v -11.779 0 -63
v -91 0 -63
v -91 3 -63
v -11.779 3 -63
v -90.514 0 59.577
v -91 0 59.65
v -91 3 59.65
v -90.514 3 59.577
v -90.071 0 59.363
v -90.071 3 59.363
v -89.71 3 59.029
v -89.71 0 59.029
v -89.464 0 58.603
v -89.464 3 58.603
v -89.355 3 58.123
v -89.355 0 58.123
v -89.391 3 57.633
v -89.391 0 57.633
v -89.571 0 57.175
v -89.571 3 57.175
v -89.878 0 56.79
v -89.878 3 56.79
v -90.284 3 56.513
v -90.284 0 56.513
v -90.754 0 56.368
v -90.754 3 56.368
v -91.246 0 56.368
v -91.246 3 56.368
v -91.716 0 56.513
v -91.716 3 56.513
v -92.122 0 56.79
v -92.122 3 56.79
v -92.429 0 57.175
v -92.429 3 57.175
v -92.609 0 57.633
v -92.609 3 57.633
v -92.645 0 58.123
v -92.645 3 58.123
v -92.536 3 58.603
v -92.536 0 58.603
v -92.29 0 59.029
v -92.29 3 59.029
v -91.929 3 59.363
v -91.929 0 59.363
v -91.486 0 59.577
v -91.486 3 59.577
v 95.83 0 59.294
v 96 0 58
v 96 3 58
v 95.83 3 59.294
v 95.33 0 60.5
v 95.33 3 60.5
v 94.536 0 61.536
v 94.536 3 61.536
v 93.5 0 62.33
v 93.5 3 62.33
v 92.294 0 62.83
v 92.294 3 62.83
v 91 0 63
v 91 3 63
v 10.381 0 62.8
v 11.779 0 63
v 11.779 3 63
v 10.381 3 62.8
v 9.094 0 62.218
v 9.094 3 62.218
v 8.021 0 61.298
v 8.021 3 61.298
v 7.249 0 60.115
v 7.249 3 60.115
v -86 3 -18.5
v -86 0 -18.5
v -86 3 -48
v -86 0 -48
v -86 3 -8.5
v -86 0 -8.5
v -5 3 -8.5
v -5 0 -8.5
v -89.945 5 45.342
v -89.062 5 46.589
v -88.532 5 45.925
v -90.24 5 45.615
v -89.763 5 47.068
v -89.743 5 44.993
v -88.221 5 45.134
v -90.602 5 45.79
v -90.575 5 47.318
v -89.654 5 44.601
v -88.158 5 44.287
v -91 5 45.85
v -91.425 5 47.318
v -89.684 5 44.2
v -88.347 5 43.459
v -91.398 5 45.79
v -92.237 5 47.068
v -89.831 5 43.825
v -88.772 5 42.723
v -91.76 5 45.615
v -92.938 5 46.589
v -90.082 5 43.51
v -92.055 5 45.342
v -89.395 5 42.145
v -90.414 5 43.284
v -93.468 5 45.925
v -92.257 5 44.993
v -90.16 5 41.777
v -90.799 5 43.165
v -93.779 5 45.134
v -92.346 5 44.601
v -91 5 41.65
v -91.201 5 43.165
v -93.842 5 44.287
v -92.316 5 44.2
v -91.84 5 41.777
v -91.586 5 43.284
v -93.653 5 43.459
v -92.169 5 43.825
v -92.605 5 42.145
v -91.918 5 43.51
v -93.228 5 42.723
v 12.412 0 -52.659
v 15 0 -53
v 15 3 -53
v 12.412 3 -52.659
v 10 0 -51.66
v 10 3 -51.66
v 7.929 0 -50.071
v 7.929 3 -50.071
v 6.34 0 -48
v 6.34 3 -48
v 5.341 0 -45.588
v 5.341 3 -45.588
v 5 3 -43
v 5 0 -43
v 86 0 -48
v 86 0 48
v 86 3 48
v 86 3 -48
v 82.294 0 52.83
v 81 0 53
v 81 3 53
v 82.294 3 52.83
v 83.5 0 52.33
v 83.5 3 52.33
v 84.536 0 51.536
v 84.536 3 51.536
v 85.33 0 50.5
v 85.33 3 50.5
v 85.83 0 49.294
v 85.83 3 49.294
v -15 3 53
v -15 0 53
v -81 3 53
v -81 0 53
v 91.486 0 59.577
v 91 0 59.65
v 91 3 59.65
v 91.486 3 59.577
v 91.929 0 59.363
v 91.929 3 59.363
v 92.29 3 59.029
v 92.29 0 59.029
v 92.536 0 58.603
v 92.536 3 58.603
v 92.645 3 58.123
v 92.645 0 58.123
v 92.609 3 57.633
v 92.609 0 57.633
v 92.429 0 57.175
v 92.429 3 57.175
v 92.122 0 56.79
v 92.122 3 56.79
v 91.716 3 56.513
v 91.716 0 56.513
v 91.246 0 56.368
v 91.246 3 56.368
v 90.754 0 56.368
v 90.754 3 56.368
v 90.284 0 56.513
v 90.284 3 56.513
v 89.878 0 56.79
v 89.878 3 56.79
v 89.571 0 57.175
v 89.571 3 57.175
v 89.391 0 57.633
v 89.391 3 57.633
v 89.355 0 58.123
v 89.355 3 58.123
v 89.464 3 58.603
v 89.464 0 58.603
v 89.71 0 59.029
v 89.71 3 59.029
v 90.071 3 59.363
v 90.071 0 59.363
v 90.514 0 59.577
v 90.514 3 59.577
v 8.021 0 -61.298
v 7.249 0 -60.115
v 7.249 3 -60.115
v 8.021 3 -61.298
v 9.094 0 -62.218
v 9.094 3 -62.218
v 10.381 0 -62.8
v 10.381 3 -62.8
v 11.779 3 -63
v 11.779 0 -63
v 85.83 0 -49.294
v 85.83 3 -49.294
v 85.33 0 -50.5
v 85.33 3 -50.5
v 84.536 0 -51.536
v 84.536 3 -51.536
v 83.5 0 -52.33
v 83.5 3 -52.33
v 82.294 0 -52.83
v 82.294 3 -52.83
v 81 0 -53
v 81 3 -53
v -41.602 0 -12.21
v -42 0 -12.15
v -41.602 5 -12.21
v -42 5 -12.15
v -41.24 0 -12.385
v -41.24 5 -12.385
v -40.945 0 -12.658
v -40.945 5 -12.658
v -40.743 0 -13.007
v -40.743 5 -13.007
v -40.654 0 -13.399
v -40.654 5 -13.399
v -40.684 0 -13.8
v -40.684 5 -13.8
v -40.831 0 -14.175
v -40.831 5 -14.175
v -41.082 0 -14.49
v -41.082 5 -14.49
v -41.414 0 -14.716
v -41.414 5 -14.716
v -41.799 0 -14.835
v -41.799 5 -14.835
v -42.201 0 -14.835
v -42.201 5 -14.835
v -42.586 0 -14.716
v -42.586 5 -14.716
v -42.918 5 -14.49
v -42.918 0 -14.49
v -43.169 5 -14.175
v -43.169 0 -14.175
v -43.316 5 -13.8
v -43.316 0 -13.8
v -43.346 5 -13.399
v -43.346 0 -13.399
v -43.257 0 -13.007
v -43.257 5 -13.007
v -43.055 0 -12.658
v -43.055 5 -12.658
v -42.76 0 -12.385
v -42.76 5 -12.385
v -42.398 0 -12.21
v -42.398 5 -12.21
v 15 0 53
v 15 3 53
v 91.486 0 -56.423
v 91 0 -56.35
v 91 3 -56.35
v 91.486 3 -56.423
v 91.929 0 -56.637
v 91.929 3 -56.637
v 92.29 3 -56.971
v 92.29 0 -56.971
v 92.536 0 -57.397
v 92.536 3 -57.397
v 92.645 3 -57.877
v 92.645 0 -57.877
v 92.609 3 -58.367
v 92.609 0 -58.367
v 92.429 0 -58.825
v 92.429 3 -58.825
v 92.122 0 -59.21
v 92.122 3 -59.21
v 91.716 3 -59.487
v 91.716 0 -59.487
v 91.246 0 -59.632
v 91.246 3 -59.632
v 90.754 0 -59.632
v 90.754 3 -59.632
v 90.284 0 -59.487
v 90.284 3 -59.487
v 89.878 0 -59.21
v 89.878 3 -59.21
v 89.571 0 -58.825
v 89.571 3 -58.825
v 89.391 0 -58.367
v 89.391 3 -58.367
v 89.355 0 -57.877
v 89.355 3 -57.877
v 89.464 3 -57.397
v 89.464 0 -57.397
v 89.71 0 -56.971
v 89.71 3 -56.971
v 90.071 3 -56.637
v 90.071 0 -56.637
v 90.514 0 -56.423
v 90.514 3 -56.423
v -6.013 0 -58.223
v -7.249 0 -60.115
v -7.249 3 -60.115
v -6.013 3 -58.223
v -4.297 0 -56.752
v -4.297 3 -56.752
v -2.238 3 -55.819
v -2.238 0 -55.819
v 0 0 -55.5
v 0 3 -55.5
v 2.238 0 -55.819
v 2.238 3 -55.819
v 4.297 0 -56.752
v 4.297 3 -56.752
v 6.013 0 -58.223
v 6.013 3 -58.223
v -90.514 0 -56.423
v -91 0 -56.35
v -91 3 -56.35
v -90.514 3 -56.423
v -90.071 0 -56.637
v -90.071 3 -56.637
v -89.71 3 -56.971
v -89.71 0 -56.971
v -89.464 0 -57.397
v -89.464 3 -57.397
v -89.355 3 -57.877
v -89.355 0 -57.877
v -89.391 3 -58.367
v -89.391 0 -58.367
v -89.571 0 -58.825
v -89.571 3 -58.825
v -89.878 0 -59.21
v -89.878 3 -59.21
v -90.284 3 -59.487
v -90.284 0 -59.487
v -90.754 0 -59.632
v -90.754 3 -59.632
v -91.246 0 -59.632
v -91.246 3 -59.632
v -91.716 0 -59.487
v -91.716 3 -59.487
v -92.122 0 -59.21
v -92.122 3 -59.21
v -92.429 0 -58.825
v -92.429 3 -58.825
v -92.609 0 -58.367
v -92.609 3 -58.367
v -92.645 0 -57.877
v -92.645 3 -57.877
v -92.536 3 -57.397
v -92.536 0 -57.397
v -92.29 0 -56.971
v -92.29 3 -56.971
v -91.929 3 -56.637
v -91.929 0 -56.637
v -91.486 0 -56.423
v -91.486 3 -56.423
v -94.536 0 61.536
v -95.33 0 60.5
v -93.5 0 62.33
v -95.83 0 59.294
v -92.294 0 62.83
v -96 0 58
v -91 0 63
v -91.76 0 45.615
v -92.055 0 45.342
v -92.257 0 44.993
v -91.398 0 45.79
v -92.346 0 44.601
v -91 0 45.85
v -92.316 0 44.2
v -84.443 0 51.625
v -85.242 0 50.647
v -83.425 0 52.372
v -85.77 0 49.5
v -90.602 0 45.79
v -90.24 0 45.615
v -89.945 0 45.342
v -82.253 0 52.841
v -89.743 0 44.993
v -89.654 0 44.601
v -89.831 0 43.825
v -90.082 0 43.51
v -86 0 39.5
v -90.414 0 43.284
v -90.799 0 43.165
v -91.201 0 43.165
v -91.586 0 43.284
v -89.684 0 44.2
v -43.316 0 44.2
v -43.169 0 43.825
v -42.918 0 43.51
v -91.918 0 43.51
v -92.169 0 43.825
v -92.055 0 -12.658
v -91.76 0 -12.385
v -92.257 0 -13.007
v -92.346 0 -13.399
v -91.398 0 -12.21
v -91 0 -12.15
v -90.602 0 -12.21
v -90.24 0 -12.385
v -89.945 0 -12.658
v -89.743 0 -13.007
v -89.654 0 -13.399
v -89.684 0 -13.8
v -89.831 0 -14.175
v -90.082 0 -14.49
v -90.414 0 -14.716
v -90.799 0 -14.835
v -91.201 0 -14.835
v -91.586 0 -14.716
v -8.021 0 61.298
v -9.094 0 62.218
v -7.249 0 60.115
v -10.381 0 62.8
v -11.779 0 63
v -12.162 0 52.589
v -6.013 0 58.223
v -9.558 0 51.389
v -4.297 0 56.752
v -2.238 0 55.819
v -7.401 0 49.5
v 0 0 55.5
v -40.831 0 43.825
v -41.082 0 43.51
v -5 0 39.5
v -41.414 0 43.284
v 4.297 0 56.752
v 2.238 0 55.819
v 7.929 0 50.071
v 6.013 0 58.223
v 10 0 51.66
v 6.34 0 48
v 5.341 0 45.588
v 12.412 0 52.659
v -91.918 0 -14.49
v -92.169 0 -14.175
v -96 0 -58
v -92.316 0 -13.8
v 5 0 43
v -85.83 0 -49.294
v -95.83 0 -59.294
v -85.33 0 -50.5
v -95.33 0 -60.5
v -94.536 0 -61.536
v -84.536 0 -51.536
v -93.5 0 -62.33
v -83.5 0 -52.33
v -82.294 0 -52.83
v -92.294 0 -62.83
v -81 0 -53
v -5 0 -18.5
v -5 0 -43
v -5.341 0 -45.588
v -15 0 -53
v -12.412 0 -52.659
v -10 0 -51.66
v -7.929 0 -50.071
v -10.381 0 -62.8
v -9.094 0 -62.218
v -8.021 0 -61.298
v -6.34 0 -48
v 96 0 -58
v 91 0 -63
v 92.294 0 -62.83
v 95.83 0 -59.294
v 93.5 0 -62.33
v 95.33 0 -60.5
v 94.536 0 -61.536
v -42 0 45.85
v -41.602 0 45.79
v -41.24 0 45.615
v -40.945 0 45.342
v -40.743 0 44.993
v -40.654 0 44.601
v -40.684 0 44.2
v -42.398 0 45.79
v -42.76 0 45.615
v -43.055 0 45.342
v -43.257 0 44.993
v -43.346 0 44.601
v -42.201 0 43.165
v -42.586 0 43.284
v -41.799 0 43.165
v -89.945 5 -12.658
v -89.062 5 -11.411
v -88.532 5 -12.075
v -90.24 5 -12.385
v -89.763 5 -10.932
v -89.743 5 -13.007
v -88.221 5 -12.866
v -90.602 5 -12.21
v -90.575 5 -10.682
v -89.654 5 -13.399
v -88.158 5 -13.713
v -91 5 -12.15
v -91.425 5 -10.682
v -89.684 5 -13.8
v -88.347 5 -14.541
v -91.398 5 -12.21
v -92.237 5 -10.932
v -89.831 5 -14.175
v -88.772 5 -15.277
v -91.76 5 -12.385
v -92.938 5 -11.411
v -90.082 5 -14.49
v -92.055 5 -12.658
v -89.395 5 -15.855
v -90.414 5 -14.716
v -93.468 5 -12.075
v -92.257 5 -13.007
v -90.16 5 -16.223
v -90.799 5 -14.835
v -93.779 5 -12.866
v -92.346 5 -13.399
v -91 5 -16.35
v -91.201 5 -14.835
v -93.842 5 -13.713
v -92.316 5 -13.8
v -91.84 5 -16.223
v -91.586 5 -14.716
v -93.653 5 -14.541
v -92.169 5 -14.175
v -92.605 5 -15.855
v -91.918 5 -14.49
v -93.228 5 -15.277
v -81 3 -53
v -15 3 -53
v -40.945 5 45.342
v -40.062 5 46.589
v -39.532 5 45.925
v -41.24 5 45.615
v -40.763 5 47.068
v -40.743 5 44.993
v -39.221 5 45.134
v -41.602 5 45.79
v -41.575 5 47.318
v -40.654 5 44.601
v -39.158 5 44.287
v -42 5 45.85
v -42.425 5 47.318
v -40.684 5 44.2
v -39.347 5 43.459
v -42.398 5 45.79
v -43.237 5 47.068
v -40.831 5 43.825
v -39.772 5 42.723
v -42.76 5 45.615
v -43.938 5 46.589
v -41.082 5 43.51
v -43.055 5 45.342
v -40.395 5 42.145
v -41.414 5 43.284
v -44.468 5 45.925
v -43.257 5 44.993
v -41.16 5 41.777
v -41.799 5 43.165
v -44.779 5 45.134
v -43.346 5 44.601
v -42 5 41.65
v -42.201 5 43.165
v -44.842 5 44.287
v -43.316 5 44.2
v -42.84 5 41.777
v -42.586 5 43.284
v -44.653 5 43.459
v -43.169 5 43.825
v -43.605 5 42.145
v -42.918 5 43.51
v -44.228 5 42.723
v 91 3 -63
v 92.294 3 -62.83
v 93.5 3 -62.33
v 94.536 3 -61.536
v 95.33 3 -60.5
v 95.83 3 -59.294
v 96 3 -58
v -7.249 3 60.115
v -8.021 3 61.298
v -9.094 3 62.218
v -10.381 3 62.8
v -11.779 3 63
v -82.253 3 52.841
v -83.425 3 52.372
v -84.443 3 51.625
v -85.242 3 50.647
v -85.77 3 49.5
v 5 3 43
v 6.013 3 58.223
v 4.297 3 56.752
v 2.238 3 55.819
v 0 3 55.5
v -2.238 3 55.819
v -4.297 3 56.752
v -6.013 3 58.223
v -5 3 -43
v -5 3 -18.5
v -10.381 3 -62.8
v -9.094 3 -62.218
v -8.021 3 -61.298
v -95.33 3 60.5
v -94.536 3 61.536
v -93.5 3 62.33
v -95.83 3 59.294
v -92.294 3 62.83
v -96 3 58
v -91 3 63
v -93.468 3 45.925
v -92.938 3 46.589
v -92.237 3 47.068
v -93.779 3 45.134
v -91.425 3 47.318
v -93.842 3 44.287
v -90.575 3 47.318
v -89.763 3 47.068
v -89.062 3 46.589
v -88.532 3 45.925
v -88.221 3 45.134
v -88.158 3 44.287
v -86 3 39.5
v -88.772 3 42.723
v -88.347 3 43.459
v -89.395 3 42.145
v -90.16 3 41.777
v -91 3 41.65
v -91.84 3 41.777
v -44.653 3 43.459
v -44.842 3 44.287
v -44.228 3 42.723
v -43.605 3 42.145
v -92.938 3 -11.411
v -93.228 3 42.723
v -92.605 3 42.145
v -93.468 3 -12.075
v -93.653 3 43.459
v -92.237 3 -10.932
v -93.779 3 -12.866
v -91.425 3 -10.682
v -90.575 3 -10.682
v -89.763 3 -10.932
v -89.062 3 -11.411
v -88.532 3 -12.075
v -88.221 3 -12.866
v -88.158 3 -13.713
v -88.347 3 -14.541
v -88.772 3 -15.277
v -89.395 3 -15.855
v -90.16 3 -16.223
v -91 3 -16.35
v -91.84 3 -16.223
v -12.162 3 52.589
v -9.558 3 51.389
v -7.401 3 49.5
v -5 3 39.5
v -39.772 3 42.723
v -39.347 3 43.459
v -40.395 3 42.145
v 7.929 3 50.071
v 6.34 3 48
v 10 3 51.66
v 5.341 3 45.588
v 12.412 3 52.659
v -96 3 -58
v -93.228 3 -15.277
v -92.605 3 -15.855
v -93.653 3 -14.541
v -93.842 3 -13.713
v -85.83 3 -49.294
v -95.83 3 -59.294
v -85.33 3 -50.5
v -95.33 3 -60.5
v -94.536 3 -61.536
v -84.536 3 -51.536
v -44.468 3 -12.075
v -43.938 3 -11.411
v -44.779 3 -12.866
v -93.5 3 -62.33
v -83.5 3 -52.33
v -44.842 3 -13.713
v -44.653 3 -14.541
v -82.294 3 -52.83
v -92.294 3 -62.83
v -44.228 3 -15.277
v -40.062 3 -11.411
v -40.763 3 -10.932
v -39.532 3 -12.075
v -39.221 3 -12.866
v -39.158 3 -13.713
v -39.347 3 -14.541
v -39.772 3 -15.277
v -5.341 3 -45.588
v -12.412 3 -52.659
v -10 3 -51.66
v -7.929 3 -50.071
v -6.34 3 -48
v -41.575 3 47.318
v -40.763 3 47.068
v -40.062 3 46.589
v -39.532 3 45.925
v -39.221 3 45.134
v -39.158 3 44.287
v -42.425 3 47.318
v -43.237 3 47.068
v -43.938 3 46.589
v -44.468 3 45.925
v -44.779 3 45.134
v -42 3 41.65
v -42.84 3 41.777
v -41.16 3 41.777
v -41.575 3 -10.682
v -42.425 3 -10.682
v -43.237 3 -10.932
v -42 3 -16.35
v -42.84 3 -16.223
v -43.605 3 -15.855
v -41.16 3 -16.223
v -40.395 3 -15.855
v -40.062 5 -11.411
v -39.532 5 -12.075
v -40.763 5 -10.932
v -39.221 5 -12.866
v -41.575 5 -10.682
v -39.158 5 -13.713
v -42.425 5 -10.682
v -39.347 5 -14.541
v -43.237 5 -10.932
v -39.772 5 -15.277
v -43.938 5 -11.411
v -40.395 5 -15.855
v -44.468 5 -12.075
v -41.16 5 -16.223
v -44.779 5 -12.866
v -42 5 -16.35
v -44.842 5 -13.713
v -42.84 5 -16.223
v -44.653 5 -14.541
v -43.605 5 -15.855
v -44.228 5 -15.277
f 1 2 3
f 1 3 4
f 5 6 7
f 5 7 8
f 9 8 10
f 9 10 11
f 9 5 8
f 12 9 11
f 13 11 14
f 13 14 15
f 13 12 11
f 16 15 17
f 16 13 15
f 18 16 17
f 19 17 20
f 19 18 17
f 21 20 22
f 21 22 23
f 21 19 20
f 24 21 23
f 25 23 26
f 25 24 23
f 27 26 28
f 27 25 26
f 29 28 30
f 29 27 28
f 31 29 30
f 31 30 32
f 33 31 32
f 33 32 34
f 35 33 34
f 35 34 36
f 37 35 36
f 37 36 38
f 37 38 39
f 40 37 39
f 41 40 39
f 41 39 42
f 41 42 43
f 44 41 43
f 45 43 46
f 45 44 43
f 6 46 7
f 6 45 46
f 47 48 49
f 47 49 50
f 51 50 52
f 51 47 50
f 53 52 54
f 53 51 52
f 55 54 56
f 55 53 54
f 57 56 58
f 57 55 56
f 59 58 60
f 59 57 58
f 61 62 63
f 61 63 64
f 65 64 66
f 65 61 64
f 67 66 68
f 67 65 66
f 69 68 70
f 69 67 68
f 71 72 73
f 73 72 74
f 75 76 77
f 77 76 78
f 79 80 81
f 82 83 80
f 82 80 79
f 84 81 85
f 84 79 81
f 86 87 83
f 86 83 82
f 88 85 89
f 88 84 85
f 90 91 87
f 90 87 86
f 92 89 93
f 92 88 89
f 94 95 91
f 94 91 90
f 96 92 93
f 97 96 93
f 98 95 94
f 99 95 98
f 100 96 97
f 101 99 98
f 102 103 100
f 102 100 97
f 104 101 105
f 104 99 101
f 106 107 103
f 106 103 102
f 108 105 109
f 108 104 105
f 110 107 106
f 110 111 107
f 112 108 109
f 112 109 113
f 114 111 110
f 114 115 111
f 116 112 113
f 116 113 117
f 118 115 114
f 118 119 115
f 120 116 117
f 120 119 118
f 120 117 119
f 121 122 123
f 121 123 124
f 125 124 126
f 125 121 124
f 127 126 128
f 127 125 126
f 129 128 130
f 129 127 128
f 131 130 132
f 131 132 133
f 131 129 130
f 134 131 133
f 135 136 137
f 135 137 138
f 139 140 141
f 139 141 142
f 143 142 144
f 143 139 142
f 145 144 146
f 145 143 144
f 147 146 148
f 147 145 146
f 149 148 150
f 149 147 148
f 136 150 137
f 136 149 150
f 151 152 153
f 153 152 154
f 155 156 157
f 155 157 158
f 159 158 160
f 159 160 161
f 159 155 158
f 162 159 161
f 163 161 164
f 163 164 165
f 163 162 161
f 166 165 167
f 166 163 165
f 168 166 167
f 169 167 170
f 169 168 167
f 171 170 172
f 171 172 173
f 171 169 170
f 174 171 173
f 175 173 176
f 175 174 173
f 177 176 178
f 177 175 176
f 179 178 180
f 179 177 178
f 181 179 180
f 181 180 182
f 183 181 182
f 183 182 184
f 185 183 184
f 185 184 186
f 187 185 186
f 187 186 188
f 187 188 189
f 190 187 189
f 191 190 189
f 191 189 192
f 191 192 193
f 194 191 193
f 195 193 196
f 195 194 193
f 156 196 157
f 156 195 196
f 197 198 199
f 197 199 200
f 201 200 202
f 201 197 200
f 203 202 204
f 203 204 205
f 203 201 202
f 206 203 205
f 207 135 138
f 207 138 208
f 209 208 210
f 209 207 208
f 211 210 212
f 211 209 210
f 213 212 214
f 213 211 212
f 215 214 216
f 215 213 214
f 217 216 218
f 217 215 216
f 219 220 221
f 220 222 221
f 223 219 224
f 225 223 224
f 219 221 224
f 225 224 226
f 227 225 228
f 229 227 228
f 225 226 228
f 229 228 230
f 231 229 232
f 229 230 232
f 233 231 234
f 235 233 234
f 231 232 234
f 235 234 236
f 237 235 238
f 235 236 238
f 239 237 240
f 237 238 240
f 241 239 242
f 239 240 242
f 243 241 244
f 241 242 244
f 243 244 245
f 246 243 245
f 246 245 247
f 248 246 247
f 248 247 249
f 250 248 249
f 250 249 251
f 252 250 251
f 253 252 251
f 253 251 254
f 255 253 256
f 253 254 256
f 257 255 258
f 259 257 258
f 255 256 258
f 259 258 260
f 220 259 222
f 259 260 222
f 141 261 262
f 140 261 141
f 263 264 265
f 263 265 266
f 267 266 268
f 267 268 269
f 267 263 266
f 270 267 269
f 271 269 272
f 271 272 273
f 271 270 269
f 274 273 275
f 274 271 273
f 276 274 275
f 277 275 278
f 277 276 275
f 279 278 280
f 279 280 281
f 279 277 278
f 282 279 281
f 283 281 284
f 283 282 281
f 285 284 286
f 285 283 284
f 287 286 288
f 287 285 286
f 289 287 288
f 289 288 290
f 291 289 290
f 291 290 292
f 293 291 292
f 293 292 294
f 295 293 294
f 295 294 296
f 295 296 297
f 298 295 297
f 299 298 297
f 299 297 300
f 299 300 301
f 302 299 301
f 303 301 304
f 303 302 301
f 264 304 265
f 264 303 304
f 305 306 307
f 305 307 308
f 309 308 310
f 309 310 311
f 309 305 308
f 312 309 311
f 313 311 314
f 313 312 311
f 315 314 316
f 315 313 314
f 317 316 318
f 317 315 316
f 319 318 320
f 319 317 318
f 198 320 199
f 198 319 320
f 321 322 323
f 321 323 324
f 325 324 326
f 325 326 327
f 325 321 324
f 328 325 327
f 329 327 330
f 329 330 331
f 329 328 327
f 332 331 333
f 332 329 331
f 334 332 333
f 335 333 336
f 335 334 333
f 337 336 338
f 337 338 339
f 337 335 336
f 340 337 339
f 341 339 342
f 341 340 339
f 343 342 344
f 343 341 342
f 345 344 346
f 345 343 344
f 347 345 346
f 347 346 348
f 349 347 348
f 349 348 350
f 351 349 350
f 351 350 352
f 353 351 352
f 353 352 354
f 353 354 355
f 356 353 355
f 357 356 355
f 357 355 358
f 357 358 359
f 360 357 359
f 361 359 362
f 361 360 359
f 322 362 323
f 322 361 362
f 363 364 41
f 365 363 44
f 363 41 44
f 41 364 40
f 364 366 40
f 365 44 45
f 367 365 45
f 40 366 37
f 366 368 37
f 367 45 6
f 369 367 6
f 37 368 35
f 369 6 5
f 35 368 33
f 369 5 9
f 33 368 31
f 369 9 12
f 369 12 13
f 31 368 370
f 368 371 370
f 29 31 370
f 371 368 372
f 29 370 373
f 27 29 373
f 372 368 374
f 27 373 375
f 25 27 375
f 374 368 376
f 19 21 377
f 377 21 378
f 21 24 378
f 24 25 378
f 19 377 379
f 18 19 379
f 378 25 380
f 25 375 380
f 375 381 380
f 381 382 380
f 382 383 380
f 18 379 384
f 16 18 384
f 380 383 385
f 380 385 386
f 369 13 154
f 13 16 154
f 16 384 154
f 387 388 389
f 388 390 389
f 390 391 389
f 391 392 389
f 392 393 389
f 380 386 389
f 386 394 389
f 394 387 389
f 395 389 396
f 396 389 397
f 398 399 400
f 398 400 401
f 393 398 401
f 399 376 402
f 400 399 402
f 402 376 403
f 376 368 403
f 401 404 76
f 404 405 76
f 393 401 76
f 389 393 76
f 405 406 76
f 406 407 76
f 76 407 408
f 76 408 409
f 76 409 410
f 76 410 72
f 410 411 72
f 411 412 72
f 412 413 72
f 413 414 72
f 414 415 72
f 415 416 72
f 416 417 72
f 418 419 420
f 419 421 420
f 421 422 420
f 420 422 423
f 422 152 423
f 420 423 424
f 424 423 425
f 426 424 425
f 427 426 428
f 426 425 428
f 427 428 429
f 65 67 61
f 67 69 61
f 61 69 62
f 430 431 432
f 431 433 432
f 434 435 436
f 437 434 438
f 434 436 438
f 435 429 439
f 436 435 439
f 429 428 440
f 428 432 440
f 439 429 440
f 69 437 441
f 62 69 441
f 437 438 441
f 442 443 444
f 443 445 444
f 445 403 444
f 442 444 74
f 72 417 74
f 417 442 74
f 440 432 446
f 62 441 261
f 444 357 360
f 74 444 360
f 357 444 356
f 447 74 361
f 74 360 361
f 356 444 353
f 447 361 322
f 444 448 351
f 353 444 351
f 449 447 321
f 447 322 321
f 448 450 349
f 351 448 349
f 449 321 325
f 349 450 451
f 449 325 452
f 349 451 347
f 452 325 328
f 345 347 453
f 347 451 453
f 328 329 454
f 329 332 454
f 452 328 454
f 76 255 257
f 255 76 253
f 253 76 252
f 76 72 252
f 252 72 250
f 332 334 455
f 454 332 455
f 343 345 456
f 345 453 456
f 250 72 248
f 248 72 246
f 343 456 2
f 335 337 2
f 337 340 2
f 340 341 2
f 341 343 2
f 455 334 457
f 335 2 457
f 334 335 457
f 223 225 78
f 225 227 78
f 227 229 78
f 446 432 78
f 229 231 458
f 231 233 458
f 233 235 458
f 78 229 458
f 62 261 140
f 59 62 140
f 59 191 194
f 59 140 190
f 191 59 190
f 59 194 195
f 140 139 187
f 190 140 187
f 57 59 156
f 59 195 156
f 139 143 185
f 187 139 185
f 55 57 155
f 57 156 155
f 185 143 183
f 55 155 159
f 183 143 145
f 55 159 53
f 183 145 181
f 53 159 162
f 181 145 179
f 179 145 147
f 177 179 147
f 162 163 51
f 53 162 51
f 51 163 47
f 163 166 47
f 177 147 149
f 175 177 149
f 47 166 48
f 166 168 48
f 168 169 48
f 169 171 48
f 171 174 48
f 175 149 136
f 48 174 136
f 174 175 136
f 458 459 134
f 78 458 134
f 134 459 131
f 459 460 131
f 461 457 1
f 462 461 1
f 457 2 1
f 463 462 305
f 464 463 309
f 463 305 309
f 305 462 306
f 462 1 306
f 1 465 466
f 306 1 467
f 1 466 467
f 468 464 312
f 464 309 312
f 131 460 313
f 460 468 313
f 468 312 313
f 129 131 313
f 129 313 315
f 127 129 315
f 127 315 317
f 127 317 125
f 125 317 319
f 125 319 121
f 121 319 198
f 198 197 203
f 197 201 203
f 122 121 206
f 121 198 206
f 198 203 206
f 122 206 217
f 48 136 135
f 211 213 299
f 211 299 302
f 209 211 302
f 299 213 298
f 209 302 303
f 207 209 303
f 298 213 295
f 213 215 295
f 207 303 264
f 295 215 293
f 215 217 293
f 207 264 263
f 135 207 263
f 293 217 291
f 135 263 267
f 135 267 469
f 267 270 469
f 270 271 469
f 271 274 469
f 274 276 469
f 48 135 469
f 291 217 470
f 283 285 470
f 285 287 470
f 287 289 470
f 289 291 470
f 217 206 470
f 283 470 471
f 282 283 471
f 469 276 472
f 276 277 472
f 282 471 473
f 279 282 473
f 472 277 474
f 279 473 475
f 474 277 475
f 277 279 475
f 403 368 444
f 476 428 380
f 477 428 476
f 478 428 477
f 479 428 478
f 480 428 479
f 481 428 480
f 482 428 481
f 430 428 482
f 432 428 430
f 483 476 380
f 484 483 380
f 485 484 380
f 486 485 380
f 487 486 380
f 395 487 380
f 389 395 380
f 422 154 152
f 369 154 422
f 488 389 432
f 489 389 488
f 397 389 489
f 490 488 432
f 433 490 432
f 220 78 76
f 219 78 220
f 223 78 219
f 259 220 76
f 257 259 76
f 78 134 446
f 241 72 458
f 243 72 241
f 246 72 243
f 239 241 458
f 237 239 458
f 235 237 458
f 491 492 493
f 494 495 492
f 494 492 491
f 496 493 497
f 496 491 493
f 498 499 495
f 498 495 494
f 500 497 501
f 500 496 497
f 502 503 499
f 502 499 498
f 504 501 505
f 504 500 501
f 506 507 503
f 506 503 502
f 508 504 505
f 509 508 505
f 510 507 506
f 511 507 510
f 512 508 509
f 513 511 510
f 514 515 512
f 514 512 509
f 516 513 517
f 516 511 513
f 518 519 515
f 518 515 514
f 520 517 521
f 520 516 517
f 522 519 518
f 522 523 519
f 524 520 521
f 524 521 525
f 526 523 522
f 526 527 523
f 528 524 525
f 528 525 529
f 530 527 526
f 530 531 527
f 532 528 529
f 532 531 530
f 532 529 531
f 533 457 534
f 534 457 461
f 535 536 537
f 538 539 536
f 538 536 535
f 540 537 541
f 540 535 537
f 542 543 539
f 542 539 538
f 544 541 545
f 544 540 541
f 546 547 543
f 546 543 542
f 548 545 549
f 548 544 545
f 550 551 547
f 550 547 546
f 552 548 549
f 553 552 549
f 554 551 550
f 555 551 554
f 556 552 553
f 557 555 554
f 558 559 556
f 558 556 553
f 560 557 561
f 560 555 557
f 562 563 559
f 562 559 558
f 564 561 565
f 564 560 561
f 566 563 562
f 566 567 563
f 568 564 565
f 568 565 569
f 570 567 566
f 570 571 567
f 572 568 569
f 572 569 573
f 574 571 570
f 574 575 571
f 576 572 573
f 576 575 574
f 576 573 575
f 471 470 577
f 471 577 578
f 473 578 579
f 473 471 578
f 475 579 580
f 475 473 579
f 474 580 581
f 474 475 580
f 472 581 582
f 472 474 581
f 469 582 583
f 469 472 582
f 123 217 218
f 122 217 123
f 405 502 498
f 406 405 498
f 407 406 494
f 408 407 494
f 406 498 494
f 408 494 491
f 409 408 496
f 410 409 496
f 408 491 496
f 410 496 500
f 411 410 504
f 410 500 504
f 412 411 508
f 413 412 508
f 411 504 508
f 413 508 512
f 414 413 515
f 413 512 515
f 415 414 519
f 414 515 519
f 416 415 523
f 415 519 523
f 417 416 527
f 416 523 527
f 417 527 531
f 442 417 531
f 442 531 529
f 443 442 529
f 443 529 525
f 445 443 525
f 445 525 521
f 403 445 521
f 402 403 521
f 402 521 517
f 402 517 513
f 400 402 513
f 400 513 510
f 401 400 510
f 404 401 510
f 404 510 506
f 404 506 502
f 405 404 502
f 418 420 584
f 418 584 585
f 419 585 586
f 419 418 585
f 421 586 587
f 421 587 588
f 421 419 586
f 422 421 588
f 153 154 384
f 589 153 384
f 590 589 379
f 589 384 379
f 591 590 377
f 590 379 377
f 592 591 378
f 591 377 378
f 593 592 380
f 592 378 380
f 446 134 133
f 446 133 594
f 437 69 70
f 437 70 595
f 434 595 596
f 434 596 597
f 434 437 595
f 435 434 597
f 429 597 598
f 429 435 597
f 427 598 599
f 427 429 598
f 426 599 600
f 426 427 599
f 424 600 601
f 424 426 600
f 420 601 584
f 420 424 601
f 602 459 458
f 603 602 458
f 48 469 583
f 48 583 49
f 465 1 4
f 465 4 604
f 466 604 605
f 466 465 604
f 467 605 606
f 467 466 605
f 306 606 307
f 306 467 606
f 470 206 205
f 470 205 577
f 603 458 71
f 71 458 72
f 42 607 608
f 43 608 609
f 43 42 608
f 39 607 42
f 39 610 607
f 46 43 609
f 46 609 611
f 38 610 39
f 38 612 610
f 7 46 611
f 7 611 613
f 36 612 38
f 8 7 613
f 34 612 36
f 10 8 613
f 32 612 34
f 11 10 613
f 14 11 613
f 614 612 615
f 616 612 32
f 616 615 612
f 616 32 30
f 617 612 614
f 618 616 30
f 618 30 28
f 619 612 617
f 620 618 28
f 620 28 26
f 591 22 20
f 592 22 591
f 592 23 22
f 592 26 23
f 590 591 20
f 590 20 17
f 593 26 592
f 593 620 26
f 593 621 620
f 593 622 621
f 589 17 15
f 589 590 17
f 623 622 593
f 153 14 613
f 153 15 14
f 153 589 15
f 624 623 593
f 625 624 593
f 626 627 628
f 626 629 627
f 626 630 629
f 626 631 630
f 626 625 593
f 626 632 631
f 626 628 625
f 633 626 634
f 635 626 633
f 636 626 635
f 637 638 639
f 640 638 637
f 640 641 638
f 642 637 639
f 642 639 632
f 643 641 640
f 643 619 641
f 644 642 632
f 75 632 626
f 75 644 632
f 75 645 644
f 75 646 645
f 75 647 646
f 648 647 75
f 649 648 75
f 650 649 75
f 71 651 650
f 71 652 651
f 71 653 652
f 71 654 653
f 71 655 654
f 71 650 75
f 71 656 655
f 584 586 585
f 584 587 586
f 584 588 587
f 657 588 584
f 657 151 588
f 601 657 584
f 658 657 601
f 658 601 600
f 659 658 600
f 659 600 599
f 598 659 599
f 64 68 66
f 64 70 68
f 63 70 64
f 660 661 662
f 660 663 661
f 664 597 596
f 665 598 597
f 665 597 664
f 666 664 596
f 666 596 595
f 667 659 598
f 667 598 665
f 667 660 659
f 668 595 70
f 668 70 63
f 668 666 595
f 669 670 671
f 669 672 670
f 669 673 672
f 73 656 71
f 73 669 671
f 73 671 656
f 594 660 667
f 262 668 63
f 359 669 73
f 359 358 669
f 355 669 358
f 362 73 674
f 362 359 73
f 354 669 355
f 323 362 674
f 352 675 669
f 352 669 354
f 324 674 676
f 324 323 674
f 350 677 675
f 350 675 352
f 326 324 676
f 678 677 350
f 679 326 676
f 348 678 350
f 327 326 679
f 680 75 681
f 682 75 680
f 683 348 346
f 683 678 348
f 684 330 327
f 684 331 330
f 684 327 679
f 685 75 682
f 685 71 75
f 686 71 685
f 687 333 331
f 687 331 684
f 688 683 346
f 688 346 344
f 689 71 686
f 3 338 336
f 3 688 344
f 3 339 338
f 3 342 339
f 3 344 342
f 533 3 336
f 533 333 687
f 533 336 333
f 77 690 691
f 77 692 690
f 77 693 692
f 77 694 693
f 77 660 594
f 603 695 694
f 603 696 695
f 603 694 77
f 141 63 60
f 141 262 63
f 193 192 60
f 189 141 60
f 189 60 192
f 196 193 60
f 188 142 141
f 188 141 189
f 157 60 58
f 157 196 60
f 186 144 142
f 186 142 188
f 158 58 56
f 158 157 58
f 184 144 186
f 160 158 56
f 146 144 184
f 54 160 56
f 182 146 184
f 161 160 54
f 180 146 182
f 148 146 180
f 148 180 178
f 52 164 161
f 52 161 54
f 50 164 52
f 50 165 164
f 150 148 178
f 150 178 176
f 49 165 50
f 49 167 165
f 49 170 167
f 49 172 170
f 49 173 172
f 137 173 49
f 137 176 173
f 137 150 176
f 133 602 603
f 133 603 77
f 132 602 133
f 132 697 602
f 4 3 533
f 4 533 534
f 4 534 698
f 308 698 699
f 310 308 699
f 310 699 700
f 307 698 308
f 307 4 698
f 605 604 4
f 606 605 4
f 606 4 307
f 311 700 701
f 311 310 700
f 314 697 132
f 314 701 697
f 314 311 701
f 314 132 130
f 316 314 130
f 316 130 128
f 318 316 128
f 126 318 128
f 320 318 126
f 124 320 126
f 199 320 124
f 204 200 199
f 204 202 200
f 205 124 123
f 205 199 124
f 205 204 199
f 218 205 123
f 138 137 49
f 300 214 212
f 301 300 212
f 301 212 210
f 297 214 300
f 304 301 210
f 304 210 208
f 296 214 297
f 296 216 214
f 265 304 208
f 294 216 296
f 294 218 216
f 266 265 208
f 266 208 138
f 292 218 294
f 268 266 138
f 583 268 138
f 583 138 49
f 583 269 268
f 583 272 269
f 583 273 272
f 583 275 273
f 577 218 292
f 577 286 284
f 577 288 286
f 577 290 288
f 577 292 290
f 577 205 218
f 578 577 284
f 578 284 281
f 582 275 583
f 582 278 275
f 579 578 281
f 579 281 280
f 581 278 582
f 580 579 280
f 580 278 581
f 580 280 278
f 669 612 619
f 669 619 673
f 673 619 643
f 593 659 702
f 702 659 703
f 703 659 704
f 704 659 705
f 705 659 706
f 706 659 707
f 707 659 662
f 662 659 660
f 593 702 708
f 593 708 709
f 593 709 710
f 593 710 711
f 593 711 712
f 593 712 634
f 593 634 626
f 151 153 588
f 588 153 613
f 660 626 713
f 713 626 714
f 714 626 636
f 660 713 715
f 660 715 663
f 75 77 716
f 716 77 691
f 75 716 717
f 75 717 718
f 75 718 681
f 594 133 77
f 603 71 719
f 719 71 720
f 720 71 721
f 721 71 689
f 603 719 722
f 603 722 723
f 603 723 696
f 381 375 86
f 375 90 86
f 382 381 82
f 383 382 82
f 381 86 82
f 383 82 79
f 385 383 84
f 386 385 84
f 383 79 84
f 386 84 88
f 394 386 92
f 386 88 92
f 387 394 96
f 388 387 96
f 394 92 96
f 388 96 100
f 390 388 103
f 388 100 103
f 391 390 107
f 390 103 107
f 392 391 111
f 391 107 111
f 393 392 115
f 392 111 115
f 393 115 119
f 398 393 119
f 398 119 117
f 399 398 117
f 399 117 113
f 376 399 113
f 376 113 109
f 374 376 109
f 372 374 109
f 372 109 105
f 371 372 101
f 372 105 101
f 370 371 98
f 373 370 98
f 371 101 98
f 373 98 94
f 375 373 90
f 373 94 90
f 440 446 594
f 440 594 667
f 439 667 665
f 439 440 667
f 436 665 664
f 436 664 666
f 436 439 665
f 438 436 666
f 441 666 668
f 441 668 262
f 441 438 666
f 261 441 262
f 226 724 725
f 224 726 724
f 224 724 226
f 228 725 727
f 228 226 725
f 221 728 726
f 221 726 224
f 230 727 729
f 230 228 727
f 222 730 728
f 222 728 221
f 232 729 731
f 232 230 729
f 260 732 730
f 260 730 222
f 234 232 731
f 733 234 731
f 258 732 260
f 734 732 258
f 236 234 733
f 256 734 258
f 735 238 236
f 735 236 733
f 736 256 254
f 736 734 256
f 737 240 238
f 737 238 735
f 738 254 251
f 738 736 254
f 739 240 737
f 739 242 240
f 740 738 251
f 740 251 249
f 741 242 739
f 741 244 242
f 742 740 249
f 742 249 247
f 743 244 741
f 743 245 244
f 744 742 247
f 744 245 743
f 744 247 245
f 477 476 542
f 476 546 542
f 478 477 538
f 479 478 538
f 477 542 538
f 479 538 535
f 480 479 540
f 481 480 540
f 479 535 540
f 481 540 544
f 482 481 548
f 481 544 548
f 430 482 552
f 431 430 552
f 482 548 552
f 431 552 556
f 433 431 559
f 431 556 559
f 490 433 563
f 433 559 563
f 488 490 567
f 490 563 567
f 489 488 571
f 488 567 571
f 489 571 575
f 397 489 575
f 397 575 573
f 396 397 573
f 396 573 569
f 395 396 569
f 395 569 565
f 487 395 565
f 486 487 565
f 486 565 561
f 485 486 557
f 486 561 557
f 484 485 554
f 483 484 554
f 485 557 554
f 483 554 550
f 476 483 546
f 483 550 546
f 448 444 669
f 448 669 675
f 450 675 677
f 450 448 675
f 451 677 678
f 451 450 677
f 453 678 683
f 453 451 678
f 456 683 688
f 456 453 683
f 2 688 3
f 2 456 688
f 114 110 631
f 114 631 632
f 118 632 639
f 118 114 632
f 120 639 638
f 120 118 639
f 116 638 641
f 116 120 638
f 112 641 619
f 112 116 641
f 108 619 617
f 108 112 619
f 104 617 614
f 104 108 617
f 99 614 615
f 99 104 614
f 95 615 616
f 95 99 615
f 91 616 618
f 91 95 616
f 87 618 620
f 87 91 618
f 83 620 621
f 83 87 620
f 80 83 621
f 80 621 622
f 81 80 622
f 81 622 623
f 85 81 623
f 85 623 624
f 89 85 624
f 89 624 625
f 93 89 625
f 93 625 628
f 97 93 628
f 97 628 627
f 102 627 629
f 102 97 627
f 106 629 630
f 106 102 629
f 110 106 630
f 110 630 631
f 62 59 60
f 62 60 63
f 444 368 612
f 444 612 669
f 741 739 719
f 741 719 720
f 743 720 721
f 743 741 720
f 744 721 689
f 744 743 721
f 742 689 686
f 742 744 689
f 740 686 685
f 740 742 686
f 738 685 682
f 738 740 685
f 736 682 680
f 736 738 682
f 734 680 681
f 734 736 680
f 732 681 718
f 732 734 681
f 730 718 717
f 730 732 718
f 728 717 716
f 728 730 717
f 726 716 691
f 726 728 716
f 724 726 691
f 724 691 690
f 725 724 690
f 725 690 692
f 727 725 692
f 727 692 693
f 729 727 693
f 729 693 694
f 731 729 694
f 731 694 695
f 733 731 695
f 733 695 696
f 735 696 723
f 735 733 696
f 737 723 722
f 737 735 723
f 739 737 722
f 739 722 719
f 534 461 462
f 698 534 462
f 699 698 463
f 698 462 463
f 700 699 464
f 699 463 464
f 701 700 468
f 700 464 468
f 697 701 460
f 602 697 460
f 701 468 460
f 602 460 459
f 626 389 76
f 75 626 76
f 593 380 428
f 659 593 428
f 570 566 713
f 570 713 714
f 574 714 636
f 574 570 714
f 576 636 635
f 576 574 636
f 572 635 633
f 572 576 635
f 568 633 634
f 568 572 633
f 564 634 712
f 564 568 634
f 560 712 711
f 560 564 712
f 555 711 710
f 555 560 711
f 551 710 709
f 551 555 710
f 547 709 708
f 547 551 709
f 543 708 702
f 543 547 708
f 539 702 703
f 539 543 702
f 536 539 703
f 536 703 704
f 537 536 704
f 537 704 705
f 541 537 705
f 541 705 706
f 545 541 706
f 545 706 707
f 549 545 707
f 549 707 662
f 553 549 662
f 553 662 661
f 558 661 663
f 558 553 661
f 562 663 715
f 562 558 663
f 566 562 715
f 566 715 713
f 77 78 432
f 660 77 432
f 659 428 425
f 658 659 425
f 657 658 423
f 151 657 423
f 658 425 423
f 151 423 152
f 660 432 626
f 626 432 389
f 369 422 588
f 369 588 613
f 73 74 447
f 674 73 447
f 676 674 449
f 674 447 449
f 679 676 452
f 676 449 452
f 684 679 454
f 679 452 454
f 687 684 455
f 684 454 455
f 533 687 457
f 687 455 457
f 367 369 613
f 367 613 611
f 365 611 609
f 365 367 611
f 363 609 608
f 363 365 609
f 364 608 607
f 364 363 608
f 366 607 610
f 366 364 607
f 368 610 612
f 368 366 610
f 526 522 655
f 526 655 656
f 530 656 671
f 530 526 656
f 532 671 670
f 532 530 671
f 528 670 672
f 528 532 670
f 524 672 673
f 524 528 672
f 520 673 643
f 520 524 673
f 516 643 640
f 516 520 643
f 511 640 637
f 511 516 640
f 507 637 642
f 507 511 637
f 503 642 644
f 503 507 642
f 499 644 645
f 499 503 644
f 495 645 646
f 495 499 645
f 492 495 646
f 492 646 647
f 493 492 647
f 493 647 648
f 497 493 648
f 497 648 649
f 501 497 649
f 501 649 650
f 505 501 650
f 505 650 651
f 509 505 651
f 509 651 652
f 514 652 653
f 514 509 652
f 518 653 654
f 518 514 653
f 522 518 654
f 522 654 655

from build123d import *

# Parameters (mm, degrees)
SKETCH1_R           = 1.65
BOSS_EXTRUDE1_DEPTH = 3
BOSS_EXTRUDE2_START = -3
BOSS_EXTRUDE2_DEPTH = 3
SKETCH3_R           = 1.35
CUT_EXTRUDE1_DEPTH  = 3
BOSS_EXTRUDE3_START = 2
SKETCH4_R           = 2.85
SKETCH4_R_2         = 1.35
BOSS_EXTRUDE3_DEPTH = 2


with BuildPart() as part:
    # Sketch1 → Boss-Extrude1 (new body)
    with BuildSketch(Plane(origin=(0, 0, 0), x_dir=(1, 0, 0), z_dir=(0, 1, 0))):
        with BuildLine():
            Line((-91, 63), (-11.779218989, 63))
            ThreePointArc((-11.779218989, 63), (-9.093788212, 62.217636961), (-7.248750147, 60.115384615))
            ThreePointArc((-7.248750147, 60.115384615), (0, 55.5), (7.248750147, 60.115384615))
            ThreePointArc((7.248750147, 60.115384615), (9.093788212, 62.217636961), (11.779218989, 63))
            Line((11.779218989, 63), (91, 63))
            ThreePointArc((91, 63), (94.535533906, 61.535533906), (96, 58))
            Line((96, 58), (96, -58))
            ThreePointArc((96, -58), (94.535533906, -61.535533906), (91, -63))
            Line((91, -63), (11.779218989, -63))
            ThreePointArc((11.779218989, -63), (9.093788212, -62.217636961), (7.248750147, -60.115384615))
            ThreePointArc((7.248750147, -60.115384615), (0, -55.5), (-7.248750147, -60.115384615))
            ThreePointArc((-7.248750147, -60.115384615), (-9.093788212, -62.217636961), (-11.779218989, -63))
            Line((-11.779218989, -63), (-91, -63))
            ThreePointArc((-91, -63), (-94.535533906, -61.535533906), (-96, -58))
            Line((-96, -58), (-96, 58))
            ThreePointArc((-96, 58), (-94.535533906, 61.535533906), (-91, 63))
        make_face()
        with Locations(Location((-91, 58, 0), (0, 0, 270))):
            Circle(SKETCH1_R, mode=Mode.SUBTRACT)
        with Locations(Location((91, 58, 0), (0, 0, 270))):
            Circle(SKETCH1_R, mode=Mode.SUBTRACT)
        with Locations(Location((91, -58, 0), (0, 0, 270))):
            Circle(SKETCH1_R, mode=Mode.SUBTRACT)
        with Locations(Location((-91, -58, 0), (0, 0, 270))):
            Circle(SKETCH1_R, mode=Mode.SUBTRACT)
        with BuildLine():
            Line((-81, 53), (-15, 53))
            ThreePointArc((-15, 53), (-7.928932188, 50.071067812), (-5, 43))
            Line((-5, 43), (-5, -43))
            ThreePointArc((-5, -43), (-7.928932188, -50.071067812), (-15, -53))
            Line((-15, -53), (-81, -53))
            ThreePointArc((-81, -53), (-84.535533906, -51.535533906), (-86, -48))
            Line((-86, -48), (-86, 48))
            ThreePointArc((-86, 48), (-84.535533906, 51.535533906), (-81, 53))
        make_face(mode=Mode.SUBTRACT)
        with BuildLine():
            Line((86, -48), (86, 48))
            ThreePointArc((86, 48), (84.535533906, 51.535533906), (81, 53))
            Line((81, 53), (15, 53))
            ThreePointArc((15, 53), (7.928932188, 50.071067812), (5, 43))
            Line((5, 43), (5, -43))
            ThreePointArc((5, -43), (7.928932188, -50.071067812), (15, -53))
            Line((15, -53), (81, -53))
            ThreePointArc((81, -53), (84.535533906, -51.535533906), (86, -48))
        make_face(mode=Mode.SUBTRACT)
    extrude(amount=BOSS_EXTRUDE1_DEPTH)

    # Sketch2 → Boss-Extrude2 (add)
    with BuildSketch(Plane(origin=(0, 3, 0), x_dir=(1, 0, 0), z_dir=(0, 1, 0)).offset(BOSS_EXTRUDE2_START)):
        with BuildLine():
            Line((-42, -39.5), (-86, -39.5))
            Line((-86, -39.5), (-86, -48))
            ThreePointArc((-86, -48), (-85.942088629, -48.758788496), (-85.769696007, -49.5))
            Line((-85.769696007, -49.5), (-42, -49.5))
            Line((-42, -49.5), (-7.400657923, -49.5))
            ThreePointArc((-7.400657923, -49.5), (-5.619343819, -46.464576398), (-5, -43))
            Line((-5, -43), (-5, -39.5))
            Line((-5, -39.5), (-42, -39.5))
        make_face()
        Polygon((-86, 18.5), (-86, 8.5), (-42, 8.5), (-5, 8.5), (-5, 18.5), (-42, 18.5), align=None)
    extrude(amount=BOSS_EXTRUDE2_DEPTH)

    # Sketch3 → Cut-Extrude1 (cut)
    with BuildSketch(Plane(origin=(0, 3, 0), x_dir=(1, 0, 0), z_dir=(0, 1, 0))):
        with Locations(Location((-42, -44.5, 0), (0, 0, 270))):
            Circle(SKETCH3_R)
        with Locations(Location((-91, -44.5, 0), (0, 0, 270))):
            Circle(SKETCH3_R)
        with Locations(Location((-42, 13.5, 0), (0, 0, 270))):
            Circle(SKETCH3_R)
        with Locations(Location((-91, 13.5, 0), (0, 0, 270))):
            Circle(SKETCH3_R)
    extrude(amount=-CUT_EXTRUDE1_DEPTH, mode=Mode.SUBTRACT)

    # Sketch4 → Boss-Extrude3 (add)
    # profile 1 of 4: a face of its own
    with BuildSketch(Plane(origin=(0, 3, 0), x_dir=(1, 0, 0), z_dir=(0, 1, 0)).offset(BOSS_EXTRUDE3_START)):
        with Locations(Location((-91, 13.5, 0), (0, 0, 90))):
            Circle(SKETCH4_R)
        with Locations(Location((-91, 13.5, 0), (0, 0, 270))):
            Circle(SKETCH4_R_2, mode=Mode.SUBTRACT)
    # profile 2 of 4: a face of its own
    with BuildSketch(Plane(origin=(0, 3, 0), x_dir=(1, 0, 0), z_dir=(0, 1, 0)).offset(BOSS_EXTRUDE3_START)):
        with Locations(Location((-91, -44.5, 0), (0, 0, 90))):
            Circle(SKETCH4_R)
        with Locations(Location((-91, -44.5, 0), (0, 0, 270))):
            Circle(SKETCH4_R_2, mode=Mode.SUBTRACT)
    # profile 3 of 4: a face of its own
    with BuildSketch(Plane(origin=(0, 3, 0), x_dir=(1, 0, 0), z_dir=(0, 1, 0)).offset(BOSS_EXTRUDE3_START)):
        with Locations(Location((-42, -44.5, 0), (0, 0, 90))):
            Circle(SKETCH4_R)
        with Locations(Location((-42, -44.5, 0), (0, 0, 270))):
            Circle(SKETCH4_R_2, mode=Mode.SUBTRACT)
    # profile 4 of 4: a face of its own
    with BuildSketch(Plane(origin=(0, 3, 0), x_dir=(1, 0, 0), z_dir=(0, 1, 0)).offset(BOSS_EXTRUDE3_START)):
        with Locations(Location((-42, 13.5, 0), (0, 0, 90))):
            Circle(SKETCH4_R)
        with Locations(Location((-42, 13.5, 0), (0, 0, 270))):
            Circle(SKETCH4_R_2, mode=Mode.SUBTRACT)
    extrude(amount=-BOSS_EXTRUDE3_DEPTH)


solid = part.part
